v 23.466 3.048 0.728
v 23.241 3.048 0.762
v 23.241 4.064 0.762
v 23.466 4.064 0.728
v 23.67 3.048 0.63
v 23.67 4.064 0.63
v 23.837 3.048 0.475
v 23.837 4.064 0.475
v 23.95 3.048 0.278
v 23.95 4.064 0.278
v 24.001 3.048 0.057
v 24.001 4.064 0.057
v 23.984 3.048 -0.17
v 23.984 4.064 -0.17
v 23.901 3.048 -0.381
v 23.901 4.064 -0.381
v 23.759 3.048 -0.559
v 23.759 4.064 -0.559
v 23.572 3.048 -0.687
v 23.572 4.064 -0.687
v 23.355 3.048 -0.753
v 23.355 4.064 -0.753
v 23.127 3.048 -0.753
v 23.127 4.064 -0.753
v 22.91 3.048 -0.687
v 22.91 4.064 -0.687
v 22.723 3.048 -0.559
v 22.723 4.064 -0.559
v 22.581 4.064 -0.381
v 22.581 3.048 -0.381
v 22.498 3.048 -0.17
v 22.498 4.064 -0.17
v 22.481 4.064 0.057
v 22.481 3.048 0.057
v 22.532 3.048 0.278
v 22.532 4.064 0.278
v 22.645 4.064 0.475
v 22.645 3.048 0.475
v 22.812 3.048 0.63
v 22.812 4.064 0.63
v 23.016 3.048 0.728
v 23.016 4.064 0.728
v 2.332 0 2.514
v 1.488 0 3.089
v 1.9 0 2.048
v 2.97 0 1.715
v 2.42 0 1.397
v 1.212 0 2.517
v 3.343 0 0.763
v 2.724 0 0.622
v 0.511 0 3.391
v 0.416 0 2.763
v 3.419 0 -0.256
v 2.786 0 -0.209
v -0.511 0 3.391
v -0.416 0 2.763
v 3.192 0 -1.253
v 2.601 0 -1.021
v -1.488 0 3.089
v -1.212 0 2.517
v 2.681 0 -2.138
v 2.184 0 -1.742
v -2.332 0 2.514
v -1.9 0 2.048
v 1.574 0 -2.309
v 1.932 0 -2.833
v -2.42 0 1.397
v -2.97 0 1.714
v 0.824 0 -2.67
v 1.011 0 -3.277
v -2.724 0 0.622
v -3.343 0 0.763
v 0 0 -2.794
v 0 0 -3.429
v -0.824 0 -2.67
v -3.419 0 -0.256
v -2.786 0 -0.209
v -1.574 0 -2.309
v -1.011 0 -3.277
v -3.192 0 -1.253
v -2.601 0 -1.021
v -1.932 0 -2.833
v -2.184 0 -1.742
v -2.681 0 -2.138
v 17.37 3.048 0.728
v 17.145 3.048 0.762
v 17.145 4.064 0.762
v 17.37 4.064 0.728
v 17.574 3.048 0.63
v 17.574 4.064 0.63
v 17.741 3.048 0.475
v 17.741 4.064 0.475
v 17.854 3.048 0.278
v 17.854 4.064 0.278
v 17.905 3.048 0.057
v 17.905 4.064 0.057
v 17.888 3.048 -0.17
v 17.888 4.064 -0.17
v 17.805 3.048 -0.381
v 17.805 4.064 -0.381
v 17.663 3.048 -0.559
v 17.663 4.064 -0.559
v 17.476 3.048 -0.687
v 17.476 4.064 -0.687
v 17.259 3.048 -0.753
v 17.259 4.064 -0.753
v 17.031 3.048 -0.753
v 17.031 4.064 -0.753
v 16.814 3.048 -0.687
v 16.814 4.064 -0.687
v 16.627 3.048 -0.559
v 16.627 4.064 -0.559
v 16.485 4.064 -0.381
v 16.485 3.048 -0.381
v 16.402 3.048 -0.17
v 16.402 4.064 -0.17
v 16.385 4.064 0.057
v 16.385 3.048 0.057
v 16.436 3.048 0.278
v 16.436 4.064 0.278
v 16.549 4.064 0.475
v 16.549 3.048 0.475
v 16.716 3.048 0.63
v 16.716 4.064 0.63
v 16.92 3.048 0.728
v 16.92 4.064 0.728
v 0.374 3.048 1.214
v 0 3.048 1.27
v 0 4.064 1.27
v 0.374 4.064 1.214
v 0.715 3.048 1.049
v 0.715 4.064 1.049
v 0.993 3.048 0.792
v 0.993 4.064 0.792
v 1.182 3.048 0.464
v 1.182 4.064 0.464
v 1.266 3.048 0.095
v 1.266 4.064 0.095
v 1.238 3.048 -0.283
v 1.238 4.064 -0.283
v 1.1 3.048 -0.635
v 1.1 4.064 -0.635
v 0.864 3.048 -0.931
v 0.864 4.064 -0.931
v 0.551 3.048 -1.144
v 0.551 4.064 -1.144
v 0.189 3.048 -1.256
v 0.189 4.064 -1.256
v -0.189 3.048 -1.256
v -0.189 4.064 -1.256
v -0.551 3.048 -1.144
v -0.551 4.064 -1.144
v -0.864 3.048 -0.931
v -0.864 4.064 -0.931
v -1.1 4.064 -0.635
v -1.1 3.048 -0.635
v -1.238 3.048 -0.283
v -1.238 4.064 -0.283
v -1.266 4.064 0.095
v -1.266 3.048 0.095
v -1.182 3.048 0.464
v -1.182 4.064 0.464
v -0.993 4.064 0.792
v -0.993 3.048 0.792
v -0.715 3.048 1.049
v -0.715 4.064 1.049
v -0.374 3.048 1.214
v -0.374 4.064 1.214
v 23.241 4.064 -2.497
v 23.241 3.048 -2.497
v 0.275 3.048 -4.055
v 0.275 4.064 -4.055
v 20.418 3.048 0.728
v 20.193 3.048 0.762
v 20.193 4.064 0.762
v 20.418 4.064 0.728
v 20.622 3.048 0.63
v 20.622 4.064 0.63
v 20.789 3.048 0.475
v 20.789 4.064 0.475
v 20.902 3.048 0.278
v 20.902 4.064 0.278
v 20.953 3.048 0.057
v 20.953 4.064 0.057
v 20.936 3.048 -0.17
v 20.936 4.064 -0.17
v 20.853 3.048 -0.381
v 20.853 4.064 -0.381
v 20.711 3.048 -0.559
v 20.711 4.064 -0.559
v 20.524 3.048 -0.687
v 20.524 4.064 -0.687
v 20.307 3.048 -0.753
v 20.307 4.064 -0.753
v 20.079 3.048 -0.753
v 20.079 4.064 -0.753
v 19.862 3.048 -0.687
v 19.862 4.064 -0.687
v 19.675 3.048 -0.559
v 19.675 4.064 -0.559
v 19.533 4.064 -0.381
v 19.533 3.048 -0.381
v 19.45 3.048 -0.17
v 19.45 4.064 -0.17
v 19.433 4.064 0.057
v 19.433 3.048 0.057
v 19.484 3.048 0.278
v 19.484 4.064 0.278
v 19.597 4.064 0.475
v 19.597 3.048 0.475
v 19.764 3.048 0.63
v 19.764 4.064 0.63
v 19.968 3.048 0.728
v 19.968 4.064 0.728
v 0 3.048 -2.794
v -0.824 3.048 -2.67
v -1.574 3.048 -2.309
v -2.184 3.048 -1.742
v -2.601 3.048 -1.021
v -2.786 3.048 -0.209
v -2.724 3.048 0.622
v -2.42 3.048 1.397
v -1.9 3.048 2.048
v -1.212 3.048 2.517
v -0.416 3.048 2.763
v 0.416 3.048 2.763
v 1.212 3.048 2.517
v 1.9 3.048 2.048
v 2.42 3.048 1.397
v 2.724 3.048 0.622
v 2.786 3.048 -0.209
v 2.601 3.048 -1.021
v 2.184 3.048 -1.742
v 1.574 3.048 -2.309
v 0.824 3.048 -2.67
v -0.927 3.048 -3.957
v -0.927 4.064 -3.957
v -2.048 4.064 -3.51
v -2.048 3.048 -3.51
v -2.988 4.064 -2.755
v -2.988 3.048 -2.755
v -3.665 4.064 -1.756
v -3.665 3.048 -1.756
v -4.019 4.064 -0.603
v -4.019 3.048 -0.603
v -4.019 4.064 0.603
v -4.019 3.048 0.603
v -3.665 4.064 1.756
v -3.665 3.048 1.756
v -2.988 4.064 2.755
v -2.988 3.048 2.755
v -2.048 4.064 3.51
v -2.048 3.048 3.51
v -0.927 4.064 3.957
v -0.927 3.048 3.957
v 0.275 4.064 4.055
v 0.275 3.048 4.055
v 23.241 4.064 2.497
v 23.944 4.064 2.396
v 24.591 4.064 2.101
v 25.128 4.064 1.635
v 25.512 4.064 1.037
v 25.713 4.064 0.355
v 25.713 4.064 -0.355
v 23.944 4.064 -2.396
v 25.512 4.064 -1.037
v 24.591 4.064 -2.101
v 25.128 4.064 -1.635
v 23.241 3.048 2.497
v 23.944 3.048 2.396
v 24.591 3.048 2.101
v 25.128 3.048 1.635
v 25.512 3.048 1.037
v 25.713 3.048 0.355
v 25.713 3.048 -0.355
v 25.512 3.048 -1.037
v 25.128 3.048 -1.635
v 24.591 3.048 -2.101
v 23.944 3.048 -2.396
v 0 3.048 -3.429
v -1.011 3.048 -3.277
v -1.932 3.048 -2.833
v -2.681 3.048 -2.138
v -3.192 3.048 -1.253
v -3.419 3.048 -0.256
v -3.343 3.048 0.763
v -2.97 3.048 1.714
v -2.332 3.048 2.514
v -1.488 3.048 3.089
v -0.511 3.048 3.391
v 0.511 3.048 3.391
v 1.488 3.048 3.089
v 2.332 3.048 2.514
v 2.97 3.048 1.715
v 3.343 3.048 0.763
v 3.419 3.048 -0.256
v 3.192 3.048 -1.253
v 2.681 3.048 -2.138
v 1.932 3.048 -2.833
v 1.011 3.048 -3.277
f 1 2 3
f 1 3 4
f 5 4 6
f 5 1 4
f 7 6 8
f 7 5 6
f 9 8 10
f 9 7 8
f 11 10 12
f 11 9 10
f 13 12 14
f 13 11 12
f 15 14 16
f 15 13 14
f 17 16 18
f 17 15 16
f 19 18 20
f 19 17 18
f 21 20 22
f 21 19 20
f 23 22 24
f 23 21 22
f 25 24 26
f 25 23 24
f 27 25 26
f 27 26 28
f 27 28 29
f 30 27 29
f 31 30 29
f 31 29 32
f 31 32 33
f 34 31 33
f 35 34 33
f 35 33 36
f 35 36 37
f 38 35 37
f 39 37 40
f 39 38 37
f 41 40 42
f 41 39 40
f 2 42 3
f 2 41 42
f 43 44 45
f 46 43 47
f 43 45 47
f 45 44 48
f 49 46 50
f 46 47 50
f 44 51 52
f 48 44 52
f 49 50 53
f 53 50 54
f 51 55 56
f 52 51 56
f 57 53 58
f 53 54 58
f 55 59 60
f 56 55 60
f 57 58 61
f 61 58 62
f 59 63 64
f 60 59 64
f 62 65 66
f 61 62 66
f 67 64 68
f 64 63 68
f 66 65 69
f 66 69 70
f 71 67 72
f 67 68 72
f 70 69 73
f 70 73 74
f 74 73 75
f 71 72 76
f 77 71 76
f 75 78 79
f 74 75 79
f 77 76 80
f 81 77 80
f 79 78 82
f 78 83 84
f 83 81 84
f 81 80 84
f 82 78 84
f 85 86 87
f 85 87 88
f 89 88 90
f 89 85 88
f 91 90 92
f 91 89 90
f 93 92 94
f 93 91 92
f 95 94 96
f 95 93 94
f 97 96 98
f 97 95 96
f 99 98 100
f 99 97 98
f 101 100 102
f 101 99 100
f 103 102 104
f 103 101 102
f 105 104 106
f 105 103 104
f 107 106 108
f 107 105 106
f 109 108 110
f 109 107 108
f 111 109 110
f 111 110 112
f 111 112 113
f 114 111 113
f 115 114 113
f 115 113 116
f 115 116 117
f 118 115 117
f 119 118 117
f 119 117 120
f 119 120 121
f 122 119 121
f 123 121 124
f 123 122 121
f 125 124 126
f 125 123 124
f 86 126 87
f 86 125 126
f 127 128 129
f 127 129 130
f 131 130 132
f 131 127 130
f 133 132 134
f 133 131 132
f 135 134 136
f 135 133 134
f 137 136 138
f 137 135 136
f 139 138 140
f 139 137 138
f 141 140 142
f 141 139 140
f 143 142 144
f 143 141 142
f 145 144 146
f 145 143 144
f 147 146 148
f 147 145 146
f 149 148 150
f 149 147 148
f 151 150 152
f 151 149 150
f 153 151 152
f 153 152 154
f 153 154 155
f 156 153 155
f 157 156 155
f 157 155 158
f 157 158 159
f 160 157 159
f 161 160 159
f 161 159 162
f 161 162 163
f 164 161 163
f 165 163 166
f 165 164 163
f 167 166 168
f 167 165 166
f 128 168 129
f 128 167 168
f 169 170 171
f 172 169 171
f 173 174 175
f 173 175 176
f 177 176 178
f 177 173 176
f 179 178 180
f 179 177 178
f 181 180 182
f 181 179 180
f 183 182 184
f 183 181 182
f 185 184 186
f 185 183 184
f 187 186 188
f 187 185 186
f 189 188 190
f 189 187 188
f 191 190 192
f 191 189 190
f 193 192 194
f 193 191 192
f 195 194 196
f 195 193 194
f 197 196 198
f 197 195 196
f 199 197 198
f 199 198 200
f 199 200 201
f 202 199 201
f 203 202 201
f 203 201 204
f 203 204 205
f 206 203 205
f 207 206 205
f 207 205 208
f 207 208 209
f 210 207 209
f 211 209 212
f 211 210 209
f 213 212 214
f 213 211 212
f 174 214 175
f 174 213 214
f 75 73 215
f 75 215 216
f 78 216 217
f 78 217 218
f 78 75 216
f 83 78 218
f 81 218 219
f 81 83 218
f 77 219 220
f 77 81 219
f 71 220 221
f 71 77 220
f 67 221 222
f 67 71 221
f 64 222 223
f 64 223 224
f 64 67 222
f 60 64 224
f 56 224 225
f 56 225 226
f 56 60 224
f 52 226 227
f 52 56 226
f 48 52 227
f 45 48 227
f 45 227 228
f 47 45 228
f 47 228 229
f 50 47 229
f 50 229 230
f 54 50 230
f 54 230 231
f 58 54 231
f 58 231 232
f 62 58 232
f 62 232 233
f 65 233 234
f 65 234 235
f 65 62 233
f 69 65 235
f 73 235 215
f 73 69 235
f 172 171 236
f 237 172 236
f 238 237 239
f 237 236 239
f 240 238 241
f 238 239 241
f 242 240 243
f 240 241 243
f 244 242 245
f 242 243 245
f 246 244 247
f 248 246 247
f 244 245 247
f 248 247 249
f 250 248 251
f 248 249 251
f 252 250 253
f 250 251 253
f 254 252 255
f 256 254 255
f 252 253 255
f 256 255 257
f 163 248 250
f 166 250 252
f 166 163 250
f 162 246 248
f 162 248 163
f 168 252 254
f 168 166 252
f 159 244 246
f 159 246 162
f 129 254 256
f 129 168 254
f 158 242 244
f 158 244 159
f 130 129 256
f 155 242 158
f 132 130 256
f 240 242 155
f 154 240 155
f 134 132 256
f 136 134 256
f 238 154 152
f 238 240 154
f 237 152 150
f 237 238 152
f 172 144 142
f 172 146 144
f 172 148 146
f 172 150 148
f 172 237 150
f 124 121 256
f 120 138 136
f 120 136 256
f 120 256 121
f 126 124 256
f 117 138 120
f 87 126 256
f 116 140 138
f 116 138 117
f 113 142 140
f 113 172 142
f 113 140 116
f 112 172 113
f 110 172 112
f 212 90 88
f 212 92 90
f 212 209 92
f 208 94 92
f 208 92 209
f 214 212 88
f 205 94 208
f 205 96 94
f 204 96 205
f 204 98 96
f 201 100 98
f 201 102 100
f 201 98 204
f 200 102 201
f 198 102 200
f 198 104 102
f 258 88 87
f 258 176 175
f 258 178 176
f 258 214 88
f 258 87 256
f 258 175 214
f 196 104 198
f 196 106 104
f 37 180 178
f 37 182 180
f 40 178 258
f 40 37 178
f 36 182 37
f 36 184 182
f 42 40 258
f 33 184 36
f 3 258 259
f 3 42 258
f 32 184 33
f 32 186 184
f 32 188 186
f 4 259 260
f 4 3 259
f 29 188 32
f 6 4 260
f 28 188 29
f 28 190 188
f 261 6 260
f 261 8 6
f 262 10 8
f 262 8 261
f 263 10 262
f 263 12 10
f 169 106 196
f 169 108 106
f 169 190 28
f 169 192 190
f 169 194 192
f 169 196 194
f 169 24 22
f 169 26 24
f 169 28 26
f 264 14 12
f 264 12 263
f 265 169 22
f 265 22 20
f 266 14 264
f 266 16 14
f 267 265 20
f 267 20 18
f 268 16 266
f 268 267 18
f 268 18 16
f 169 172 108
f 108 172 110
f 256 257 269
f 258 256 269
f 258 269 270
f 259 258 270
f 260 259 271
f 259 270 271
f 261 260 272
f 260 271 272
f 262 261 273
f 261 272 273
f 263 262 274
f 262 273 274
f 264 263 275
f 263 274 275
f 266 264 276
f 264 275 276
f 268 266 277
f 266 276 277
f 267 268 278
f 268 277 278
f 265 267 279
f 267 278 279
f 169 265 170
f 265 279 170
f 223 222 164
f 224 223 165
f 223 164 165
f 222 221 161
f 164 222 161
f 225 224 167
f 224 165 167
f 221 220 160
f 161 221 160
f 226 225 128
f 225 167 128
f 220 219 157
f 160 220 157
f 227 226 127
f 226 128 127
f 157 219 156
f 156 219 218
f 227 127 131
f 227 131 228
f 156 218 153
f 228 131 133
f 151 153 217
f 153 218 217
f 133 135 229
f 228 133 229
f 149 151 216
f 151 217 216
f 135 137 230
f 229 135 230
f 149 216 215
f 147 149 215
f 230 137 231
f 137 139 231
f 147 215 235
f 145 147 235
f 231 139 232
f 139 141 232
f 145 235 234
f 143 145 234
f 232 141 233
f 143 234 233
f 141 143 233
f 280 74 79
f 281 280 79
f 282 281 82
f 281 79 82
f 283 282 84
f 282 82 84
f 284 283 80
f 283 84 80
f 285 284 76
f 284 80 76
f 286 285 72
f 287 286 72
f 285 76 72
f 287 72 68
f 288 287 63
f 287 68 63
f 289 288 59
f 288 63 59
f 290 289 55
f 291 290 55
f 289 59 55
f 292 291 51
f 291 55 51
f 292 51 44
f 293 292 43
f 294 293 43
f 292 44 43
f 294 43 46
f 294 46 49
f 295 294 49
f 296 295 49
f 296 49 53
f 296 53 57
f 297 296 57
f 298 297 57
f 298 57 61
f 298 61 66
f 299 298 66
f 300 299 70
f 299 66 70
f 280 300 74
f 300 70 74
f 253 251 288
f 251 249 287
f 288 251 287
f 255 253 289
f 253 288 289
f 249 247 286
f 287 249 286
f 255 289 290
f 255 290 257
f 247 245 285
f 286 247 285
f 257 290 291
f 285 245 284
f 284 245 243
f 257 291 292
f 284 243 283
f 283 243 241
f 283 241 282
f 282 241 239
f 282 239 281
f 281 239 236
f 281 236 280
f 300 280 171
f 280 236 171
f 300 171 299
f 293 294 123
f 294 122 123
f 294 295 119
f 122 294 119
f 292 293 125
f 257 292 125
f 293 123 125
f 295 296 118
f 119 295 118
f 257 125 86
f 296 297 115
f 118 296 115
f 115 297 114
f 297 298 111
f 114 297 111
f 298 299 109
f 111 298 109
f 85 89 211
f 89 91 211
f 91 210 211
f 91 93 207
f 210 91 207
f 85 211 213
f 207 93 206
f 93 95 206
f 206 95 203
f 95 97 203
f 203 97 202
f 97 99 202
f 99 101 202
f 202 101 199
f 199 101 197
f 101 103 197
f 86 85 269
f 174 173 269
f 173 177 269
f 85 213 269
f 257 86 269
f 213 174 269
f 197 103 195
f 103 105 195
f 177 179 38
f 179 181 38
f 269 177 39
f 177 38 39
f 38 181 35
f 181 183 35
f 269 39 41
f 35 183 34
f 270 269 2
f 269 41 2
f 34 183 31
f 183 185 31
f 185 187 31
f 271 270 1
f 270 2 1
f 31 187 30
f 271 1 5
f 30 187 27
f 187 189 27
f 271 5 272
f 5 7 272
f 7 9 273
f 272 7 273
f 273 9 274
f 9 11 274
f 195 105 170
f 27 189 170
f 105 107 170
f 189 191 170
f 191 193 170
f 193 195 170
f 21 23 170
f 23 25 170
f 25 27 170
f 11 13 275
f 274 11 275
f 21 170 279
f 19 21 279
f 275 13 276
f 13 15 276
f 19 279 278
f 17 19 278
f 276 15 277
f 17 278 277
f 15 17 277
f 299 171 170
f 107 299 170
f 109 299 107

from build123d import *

# Parameters (mm, degrees)
SKETCH5_R           = 3.429
SKETCH5_R_2         = 2.794
BOSS_EXTRUDE3_DEPTH = 3.048
SKETCH6_R           = 0.762
SKETCH6_R_2         = 1.27
BOSS_EXTRUDE4_DEPTH = 1.016


with BuildPart() as part:
    # Sketch5 → Boss-Extrude3 (new body)
    with BuildSketch(Plane(origin=(0, 0, 0), x_dir=(1, 0, 0), z_dir=(0, 1, 0))):
        with Locations(Location((0, 0, 0), (0, 0, 90))):
            Circle(SKETCH5_R)
        with Locations(Location((0, 0, 0), (0, 0, 90))):
            Circle(SKETCH5_R_2, mode=Mode.SUBTRACT)
    extrude(amount=BOSS_EXTRUDE3_DEPTH)

    # Sketch6 → Boss-Extrude4 (add)
    with BuildSketch(Plane(origin=(0, 3.048, 0), x_dir=(1, 0, 0), z_dir=(0, 1, 0))):
        with BuildLine():
            ThreePointArc((0.275010076, 4.054684385), (-4.064, 0), (0.275010076, -4.054684385))
            Line((0.275010076, -4.054684385), (23.241, -2.497009847))
            ThreePointArc((23.241, -2.497009847), (25.738009847, 0), (23.241, 2.497009847))
            Line((23.241, 2.497009847), (0.275010076, 4.054684385))
        make_face()
        with Locations(Location((20.193, 0, 0), (0, 0, 270))):
            Circle(SKETCH6_R, mode=Mode.SUBTRACT)
        with Locations(Location((0, 0, 0), (0, 0, 270))):
            Circle(SKETCH6_R_2, mode=Mode.SUBTRACT)
        with Locations(Location((17.145, 0, 0), (0, 0, 270))):
            Circle(SKETCH6_R, mode=Mode.SUBTRACT)
        with Locations(Location((23.241, 0, 0), (0, 0, 270))):
            Circle(SKETCH6_R, mode=Mode.SUBTRACT)
    extrude(amount=BOSS_EXTRUDE4_DEPTH)


solid = part.part
